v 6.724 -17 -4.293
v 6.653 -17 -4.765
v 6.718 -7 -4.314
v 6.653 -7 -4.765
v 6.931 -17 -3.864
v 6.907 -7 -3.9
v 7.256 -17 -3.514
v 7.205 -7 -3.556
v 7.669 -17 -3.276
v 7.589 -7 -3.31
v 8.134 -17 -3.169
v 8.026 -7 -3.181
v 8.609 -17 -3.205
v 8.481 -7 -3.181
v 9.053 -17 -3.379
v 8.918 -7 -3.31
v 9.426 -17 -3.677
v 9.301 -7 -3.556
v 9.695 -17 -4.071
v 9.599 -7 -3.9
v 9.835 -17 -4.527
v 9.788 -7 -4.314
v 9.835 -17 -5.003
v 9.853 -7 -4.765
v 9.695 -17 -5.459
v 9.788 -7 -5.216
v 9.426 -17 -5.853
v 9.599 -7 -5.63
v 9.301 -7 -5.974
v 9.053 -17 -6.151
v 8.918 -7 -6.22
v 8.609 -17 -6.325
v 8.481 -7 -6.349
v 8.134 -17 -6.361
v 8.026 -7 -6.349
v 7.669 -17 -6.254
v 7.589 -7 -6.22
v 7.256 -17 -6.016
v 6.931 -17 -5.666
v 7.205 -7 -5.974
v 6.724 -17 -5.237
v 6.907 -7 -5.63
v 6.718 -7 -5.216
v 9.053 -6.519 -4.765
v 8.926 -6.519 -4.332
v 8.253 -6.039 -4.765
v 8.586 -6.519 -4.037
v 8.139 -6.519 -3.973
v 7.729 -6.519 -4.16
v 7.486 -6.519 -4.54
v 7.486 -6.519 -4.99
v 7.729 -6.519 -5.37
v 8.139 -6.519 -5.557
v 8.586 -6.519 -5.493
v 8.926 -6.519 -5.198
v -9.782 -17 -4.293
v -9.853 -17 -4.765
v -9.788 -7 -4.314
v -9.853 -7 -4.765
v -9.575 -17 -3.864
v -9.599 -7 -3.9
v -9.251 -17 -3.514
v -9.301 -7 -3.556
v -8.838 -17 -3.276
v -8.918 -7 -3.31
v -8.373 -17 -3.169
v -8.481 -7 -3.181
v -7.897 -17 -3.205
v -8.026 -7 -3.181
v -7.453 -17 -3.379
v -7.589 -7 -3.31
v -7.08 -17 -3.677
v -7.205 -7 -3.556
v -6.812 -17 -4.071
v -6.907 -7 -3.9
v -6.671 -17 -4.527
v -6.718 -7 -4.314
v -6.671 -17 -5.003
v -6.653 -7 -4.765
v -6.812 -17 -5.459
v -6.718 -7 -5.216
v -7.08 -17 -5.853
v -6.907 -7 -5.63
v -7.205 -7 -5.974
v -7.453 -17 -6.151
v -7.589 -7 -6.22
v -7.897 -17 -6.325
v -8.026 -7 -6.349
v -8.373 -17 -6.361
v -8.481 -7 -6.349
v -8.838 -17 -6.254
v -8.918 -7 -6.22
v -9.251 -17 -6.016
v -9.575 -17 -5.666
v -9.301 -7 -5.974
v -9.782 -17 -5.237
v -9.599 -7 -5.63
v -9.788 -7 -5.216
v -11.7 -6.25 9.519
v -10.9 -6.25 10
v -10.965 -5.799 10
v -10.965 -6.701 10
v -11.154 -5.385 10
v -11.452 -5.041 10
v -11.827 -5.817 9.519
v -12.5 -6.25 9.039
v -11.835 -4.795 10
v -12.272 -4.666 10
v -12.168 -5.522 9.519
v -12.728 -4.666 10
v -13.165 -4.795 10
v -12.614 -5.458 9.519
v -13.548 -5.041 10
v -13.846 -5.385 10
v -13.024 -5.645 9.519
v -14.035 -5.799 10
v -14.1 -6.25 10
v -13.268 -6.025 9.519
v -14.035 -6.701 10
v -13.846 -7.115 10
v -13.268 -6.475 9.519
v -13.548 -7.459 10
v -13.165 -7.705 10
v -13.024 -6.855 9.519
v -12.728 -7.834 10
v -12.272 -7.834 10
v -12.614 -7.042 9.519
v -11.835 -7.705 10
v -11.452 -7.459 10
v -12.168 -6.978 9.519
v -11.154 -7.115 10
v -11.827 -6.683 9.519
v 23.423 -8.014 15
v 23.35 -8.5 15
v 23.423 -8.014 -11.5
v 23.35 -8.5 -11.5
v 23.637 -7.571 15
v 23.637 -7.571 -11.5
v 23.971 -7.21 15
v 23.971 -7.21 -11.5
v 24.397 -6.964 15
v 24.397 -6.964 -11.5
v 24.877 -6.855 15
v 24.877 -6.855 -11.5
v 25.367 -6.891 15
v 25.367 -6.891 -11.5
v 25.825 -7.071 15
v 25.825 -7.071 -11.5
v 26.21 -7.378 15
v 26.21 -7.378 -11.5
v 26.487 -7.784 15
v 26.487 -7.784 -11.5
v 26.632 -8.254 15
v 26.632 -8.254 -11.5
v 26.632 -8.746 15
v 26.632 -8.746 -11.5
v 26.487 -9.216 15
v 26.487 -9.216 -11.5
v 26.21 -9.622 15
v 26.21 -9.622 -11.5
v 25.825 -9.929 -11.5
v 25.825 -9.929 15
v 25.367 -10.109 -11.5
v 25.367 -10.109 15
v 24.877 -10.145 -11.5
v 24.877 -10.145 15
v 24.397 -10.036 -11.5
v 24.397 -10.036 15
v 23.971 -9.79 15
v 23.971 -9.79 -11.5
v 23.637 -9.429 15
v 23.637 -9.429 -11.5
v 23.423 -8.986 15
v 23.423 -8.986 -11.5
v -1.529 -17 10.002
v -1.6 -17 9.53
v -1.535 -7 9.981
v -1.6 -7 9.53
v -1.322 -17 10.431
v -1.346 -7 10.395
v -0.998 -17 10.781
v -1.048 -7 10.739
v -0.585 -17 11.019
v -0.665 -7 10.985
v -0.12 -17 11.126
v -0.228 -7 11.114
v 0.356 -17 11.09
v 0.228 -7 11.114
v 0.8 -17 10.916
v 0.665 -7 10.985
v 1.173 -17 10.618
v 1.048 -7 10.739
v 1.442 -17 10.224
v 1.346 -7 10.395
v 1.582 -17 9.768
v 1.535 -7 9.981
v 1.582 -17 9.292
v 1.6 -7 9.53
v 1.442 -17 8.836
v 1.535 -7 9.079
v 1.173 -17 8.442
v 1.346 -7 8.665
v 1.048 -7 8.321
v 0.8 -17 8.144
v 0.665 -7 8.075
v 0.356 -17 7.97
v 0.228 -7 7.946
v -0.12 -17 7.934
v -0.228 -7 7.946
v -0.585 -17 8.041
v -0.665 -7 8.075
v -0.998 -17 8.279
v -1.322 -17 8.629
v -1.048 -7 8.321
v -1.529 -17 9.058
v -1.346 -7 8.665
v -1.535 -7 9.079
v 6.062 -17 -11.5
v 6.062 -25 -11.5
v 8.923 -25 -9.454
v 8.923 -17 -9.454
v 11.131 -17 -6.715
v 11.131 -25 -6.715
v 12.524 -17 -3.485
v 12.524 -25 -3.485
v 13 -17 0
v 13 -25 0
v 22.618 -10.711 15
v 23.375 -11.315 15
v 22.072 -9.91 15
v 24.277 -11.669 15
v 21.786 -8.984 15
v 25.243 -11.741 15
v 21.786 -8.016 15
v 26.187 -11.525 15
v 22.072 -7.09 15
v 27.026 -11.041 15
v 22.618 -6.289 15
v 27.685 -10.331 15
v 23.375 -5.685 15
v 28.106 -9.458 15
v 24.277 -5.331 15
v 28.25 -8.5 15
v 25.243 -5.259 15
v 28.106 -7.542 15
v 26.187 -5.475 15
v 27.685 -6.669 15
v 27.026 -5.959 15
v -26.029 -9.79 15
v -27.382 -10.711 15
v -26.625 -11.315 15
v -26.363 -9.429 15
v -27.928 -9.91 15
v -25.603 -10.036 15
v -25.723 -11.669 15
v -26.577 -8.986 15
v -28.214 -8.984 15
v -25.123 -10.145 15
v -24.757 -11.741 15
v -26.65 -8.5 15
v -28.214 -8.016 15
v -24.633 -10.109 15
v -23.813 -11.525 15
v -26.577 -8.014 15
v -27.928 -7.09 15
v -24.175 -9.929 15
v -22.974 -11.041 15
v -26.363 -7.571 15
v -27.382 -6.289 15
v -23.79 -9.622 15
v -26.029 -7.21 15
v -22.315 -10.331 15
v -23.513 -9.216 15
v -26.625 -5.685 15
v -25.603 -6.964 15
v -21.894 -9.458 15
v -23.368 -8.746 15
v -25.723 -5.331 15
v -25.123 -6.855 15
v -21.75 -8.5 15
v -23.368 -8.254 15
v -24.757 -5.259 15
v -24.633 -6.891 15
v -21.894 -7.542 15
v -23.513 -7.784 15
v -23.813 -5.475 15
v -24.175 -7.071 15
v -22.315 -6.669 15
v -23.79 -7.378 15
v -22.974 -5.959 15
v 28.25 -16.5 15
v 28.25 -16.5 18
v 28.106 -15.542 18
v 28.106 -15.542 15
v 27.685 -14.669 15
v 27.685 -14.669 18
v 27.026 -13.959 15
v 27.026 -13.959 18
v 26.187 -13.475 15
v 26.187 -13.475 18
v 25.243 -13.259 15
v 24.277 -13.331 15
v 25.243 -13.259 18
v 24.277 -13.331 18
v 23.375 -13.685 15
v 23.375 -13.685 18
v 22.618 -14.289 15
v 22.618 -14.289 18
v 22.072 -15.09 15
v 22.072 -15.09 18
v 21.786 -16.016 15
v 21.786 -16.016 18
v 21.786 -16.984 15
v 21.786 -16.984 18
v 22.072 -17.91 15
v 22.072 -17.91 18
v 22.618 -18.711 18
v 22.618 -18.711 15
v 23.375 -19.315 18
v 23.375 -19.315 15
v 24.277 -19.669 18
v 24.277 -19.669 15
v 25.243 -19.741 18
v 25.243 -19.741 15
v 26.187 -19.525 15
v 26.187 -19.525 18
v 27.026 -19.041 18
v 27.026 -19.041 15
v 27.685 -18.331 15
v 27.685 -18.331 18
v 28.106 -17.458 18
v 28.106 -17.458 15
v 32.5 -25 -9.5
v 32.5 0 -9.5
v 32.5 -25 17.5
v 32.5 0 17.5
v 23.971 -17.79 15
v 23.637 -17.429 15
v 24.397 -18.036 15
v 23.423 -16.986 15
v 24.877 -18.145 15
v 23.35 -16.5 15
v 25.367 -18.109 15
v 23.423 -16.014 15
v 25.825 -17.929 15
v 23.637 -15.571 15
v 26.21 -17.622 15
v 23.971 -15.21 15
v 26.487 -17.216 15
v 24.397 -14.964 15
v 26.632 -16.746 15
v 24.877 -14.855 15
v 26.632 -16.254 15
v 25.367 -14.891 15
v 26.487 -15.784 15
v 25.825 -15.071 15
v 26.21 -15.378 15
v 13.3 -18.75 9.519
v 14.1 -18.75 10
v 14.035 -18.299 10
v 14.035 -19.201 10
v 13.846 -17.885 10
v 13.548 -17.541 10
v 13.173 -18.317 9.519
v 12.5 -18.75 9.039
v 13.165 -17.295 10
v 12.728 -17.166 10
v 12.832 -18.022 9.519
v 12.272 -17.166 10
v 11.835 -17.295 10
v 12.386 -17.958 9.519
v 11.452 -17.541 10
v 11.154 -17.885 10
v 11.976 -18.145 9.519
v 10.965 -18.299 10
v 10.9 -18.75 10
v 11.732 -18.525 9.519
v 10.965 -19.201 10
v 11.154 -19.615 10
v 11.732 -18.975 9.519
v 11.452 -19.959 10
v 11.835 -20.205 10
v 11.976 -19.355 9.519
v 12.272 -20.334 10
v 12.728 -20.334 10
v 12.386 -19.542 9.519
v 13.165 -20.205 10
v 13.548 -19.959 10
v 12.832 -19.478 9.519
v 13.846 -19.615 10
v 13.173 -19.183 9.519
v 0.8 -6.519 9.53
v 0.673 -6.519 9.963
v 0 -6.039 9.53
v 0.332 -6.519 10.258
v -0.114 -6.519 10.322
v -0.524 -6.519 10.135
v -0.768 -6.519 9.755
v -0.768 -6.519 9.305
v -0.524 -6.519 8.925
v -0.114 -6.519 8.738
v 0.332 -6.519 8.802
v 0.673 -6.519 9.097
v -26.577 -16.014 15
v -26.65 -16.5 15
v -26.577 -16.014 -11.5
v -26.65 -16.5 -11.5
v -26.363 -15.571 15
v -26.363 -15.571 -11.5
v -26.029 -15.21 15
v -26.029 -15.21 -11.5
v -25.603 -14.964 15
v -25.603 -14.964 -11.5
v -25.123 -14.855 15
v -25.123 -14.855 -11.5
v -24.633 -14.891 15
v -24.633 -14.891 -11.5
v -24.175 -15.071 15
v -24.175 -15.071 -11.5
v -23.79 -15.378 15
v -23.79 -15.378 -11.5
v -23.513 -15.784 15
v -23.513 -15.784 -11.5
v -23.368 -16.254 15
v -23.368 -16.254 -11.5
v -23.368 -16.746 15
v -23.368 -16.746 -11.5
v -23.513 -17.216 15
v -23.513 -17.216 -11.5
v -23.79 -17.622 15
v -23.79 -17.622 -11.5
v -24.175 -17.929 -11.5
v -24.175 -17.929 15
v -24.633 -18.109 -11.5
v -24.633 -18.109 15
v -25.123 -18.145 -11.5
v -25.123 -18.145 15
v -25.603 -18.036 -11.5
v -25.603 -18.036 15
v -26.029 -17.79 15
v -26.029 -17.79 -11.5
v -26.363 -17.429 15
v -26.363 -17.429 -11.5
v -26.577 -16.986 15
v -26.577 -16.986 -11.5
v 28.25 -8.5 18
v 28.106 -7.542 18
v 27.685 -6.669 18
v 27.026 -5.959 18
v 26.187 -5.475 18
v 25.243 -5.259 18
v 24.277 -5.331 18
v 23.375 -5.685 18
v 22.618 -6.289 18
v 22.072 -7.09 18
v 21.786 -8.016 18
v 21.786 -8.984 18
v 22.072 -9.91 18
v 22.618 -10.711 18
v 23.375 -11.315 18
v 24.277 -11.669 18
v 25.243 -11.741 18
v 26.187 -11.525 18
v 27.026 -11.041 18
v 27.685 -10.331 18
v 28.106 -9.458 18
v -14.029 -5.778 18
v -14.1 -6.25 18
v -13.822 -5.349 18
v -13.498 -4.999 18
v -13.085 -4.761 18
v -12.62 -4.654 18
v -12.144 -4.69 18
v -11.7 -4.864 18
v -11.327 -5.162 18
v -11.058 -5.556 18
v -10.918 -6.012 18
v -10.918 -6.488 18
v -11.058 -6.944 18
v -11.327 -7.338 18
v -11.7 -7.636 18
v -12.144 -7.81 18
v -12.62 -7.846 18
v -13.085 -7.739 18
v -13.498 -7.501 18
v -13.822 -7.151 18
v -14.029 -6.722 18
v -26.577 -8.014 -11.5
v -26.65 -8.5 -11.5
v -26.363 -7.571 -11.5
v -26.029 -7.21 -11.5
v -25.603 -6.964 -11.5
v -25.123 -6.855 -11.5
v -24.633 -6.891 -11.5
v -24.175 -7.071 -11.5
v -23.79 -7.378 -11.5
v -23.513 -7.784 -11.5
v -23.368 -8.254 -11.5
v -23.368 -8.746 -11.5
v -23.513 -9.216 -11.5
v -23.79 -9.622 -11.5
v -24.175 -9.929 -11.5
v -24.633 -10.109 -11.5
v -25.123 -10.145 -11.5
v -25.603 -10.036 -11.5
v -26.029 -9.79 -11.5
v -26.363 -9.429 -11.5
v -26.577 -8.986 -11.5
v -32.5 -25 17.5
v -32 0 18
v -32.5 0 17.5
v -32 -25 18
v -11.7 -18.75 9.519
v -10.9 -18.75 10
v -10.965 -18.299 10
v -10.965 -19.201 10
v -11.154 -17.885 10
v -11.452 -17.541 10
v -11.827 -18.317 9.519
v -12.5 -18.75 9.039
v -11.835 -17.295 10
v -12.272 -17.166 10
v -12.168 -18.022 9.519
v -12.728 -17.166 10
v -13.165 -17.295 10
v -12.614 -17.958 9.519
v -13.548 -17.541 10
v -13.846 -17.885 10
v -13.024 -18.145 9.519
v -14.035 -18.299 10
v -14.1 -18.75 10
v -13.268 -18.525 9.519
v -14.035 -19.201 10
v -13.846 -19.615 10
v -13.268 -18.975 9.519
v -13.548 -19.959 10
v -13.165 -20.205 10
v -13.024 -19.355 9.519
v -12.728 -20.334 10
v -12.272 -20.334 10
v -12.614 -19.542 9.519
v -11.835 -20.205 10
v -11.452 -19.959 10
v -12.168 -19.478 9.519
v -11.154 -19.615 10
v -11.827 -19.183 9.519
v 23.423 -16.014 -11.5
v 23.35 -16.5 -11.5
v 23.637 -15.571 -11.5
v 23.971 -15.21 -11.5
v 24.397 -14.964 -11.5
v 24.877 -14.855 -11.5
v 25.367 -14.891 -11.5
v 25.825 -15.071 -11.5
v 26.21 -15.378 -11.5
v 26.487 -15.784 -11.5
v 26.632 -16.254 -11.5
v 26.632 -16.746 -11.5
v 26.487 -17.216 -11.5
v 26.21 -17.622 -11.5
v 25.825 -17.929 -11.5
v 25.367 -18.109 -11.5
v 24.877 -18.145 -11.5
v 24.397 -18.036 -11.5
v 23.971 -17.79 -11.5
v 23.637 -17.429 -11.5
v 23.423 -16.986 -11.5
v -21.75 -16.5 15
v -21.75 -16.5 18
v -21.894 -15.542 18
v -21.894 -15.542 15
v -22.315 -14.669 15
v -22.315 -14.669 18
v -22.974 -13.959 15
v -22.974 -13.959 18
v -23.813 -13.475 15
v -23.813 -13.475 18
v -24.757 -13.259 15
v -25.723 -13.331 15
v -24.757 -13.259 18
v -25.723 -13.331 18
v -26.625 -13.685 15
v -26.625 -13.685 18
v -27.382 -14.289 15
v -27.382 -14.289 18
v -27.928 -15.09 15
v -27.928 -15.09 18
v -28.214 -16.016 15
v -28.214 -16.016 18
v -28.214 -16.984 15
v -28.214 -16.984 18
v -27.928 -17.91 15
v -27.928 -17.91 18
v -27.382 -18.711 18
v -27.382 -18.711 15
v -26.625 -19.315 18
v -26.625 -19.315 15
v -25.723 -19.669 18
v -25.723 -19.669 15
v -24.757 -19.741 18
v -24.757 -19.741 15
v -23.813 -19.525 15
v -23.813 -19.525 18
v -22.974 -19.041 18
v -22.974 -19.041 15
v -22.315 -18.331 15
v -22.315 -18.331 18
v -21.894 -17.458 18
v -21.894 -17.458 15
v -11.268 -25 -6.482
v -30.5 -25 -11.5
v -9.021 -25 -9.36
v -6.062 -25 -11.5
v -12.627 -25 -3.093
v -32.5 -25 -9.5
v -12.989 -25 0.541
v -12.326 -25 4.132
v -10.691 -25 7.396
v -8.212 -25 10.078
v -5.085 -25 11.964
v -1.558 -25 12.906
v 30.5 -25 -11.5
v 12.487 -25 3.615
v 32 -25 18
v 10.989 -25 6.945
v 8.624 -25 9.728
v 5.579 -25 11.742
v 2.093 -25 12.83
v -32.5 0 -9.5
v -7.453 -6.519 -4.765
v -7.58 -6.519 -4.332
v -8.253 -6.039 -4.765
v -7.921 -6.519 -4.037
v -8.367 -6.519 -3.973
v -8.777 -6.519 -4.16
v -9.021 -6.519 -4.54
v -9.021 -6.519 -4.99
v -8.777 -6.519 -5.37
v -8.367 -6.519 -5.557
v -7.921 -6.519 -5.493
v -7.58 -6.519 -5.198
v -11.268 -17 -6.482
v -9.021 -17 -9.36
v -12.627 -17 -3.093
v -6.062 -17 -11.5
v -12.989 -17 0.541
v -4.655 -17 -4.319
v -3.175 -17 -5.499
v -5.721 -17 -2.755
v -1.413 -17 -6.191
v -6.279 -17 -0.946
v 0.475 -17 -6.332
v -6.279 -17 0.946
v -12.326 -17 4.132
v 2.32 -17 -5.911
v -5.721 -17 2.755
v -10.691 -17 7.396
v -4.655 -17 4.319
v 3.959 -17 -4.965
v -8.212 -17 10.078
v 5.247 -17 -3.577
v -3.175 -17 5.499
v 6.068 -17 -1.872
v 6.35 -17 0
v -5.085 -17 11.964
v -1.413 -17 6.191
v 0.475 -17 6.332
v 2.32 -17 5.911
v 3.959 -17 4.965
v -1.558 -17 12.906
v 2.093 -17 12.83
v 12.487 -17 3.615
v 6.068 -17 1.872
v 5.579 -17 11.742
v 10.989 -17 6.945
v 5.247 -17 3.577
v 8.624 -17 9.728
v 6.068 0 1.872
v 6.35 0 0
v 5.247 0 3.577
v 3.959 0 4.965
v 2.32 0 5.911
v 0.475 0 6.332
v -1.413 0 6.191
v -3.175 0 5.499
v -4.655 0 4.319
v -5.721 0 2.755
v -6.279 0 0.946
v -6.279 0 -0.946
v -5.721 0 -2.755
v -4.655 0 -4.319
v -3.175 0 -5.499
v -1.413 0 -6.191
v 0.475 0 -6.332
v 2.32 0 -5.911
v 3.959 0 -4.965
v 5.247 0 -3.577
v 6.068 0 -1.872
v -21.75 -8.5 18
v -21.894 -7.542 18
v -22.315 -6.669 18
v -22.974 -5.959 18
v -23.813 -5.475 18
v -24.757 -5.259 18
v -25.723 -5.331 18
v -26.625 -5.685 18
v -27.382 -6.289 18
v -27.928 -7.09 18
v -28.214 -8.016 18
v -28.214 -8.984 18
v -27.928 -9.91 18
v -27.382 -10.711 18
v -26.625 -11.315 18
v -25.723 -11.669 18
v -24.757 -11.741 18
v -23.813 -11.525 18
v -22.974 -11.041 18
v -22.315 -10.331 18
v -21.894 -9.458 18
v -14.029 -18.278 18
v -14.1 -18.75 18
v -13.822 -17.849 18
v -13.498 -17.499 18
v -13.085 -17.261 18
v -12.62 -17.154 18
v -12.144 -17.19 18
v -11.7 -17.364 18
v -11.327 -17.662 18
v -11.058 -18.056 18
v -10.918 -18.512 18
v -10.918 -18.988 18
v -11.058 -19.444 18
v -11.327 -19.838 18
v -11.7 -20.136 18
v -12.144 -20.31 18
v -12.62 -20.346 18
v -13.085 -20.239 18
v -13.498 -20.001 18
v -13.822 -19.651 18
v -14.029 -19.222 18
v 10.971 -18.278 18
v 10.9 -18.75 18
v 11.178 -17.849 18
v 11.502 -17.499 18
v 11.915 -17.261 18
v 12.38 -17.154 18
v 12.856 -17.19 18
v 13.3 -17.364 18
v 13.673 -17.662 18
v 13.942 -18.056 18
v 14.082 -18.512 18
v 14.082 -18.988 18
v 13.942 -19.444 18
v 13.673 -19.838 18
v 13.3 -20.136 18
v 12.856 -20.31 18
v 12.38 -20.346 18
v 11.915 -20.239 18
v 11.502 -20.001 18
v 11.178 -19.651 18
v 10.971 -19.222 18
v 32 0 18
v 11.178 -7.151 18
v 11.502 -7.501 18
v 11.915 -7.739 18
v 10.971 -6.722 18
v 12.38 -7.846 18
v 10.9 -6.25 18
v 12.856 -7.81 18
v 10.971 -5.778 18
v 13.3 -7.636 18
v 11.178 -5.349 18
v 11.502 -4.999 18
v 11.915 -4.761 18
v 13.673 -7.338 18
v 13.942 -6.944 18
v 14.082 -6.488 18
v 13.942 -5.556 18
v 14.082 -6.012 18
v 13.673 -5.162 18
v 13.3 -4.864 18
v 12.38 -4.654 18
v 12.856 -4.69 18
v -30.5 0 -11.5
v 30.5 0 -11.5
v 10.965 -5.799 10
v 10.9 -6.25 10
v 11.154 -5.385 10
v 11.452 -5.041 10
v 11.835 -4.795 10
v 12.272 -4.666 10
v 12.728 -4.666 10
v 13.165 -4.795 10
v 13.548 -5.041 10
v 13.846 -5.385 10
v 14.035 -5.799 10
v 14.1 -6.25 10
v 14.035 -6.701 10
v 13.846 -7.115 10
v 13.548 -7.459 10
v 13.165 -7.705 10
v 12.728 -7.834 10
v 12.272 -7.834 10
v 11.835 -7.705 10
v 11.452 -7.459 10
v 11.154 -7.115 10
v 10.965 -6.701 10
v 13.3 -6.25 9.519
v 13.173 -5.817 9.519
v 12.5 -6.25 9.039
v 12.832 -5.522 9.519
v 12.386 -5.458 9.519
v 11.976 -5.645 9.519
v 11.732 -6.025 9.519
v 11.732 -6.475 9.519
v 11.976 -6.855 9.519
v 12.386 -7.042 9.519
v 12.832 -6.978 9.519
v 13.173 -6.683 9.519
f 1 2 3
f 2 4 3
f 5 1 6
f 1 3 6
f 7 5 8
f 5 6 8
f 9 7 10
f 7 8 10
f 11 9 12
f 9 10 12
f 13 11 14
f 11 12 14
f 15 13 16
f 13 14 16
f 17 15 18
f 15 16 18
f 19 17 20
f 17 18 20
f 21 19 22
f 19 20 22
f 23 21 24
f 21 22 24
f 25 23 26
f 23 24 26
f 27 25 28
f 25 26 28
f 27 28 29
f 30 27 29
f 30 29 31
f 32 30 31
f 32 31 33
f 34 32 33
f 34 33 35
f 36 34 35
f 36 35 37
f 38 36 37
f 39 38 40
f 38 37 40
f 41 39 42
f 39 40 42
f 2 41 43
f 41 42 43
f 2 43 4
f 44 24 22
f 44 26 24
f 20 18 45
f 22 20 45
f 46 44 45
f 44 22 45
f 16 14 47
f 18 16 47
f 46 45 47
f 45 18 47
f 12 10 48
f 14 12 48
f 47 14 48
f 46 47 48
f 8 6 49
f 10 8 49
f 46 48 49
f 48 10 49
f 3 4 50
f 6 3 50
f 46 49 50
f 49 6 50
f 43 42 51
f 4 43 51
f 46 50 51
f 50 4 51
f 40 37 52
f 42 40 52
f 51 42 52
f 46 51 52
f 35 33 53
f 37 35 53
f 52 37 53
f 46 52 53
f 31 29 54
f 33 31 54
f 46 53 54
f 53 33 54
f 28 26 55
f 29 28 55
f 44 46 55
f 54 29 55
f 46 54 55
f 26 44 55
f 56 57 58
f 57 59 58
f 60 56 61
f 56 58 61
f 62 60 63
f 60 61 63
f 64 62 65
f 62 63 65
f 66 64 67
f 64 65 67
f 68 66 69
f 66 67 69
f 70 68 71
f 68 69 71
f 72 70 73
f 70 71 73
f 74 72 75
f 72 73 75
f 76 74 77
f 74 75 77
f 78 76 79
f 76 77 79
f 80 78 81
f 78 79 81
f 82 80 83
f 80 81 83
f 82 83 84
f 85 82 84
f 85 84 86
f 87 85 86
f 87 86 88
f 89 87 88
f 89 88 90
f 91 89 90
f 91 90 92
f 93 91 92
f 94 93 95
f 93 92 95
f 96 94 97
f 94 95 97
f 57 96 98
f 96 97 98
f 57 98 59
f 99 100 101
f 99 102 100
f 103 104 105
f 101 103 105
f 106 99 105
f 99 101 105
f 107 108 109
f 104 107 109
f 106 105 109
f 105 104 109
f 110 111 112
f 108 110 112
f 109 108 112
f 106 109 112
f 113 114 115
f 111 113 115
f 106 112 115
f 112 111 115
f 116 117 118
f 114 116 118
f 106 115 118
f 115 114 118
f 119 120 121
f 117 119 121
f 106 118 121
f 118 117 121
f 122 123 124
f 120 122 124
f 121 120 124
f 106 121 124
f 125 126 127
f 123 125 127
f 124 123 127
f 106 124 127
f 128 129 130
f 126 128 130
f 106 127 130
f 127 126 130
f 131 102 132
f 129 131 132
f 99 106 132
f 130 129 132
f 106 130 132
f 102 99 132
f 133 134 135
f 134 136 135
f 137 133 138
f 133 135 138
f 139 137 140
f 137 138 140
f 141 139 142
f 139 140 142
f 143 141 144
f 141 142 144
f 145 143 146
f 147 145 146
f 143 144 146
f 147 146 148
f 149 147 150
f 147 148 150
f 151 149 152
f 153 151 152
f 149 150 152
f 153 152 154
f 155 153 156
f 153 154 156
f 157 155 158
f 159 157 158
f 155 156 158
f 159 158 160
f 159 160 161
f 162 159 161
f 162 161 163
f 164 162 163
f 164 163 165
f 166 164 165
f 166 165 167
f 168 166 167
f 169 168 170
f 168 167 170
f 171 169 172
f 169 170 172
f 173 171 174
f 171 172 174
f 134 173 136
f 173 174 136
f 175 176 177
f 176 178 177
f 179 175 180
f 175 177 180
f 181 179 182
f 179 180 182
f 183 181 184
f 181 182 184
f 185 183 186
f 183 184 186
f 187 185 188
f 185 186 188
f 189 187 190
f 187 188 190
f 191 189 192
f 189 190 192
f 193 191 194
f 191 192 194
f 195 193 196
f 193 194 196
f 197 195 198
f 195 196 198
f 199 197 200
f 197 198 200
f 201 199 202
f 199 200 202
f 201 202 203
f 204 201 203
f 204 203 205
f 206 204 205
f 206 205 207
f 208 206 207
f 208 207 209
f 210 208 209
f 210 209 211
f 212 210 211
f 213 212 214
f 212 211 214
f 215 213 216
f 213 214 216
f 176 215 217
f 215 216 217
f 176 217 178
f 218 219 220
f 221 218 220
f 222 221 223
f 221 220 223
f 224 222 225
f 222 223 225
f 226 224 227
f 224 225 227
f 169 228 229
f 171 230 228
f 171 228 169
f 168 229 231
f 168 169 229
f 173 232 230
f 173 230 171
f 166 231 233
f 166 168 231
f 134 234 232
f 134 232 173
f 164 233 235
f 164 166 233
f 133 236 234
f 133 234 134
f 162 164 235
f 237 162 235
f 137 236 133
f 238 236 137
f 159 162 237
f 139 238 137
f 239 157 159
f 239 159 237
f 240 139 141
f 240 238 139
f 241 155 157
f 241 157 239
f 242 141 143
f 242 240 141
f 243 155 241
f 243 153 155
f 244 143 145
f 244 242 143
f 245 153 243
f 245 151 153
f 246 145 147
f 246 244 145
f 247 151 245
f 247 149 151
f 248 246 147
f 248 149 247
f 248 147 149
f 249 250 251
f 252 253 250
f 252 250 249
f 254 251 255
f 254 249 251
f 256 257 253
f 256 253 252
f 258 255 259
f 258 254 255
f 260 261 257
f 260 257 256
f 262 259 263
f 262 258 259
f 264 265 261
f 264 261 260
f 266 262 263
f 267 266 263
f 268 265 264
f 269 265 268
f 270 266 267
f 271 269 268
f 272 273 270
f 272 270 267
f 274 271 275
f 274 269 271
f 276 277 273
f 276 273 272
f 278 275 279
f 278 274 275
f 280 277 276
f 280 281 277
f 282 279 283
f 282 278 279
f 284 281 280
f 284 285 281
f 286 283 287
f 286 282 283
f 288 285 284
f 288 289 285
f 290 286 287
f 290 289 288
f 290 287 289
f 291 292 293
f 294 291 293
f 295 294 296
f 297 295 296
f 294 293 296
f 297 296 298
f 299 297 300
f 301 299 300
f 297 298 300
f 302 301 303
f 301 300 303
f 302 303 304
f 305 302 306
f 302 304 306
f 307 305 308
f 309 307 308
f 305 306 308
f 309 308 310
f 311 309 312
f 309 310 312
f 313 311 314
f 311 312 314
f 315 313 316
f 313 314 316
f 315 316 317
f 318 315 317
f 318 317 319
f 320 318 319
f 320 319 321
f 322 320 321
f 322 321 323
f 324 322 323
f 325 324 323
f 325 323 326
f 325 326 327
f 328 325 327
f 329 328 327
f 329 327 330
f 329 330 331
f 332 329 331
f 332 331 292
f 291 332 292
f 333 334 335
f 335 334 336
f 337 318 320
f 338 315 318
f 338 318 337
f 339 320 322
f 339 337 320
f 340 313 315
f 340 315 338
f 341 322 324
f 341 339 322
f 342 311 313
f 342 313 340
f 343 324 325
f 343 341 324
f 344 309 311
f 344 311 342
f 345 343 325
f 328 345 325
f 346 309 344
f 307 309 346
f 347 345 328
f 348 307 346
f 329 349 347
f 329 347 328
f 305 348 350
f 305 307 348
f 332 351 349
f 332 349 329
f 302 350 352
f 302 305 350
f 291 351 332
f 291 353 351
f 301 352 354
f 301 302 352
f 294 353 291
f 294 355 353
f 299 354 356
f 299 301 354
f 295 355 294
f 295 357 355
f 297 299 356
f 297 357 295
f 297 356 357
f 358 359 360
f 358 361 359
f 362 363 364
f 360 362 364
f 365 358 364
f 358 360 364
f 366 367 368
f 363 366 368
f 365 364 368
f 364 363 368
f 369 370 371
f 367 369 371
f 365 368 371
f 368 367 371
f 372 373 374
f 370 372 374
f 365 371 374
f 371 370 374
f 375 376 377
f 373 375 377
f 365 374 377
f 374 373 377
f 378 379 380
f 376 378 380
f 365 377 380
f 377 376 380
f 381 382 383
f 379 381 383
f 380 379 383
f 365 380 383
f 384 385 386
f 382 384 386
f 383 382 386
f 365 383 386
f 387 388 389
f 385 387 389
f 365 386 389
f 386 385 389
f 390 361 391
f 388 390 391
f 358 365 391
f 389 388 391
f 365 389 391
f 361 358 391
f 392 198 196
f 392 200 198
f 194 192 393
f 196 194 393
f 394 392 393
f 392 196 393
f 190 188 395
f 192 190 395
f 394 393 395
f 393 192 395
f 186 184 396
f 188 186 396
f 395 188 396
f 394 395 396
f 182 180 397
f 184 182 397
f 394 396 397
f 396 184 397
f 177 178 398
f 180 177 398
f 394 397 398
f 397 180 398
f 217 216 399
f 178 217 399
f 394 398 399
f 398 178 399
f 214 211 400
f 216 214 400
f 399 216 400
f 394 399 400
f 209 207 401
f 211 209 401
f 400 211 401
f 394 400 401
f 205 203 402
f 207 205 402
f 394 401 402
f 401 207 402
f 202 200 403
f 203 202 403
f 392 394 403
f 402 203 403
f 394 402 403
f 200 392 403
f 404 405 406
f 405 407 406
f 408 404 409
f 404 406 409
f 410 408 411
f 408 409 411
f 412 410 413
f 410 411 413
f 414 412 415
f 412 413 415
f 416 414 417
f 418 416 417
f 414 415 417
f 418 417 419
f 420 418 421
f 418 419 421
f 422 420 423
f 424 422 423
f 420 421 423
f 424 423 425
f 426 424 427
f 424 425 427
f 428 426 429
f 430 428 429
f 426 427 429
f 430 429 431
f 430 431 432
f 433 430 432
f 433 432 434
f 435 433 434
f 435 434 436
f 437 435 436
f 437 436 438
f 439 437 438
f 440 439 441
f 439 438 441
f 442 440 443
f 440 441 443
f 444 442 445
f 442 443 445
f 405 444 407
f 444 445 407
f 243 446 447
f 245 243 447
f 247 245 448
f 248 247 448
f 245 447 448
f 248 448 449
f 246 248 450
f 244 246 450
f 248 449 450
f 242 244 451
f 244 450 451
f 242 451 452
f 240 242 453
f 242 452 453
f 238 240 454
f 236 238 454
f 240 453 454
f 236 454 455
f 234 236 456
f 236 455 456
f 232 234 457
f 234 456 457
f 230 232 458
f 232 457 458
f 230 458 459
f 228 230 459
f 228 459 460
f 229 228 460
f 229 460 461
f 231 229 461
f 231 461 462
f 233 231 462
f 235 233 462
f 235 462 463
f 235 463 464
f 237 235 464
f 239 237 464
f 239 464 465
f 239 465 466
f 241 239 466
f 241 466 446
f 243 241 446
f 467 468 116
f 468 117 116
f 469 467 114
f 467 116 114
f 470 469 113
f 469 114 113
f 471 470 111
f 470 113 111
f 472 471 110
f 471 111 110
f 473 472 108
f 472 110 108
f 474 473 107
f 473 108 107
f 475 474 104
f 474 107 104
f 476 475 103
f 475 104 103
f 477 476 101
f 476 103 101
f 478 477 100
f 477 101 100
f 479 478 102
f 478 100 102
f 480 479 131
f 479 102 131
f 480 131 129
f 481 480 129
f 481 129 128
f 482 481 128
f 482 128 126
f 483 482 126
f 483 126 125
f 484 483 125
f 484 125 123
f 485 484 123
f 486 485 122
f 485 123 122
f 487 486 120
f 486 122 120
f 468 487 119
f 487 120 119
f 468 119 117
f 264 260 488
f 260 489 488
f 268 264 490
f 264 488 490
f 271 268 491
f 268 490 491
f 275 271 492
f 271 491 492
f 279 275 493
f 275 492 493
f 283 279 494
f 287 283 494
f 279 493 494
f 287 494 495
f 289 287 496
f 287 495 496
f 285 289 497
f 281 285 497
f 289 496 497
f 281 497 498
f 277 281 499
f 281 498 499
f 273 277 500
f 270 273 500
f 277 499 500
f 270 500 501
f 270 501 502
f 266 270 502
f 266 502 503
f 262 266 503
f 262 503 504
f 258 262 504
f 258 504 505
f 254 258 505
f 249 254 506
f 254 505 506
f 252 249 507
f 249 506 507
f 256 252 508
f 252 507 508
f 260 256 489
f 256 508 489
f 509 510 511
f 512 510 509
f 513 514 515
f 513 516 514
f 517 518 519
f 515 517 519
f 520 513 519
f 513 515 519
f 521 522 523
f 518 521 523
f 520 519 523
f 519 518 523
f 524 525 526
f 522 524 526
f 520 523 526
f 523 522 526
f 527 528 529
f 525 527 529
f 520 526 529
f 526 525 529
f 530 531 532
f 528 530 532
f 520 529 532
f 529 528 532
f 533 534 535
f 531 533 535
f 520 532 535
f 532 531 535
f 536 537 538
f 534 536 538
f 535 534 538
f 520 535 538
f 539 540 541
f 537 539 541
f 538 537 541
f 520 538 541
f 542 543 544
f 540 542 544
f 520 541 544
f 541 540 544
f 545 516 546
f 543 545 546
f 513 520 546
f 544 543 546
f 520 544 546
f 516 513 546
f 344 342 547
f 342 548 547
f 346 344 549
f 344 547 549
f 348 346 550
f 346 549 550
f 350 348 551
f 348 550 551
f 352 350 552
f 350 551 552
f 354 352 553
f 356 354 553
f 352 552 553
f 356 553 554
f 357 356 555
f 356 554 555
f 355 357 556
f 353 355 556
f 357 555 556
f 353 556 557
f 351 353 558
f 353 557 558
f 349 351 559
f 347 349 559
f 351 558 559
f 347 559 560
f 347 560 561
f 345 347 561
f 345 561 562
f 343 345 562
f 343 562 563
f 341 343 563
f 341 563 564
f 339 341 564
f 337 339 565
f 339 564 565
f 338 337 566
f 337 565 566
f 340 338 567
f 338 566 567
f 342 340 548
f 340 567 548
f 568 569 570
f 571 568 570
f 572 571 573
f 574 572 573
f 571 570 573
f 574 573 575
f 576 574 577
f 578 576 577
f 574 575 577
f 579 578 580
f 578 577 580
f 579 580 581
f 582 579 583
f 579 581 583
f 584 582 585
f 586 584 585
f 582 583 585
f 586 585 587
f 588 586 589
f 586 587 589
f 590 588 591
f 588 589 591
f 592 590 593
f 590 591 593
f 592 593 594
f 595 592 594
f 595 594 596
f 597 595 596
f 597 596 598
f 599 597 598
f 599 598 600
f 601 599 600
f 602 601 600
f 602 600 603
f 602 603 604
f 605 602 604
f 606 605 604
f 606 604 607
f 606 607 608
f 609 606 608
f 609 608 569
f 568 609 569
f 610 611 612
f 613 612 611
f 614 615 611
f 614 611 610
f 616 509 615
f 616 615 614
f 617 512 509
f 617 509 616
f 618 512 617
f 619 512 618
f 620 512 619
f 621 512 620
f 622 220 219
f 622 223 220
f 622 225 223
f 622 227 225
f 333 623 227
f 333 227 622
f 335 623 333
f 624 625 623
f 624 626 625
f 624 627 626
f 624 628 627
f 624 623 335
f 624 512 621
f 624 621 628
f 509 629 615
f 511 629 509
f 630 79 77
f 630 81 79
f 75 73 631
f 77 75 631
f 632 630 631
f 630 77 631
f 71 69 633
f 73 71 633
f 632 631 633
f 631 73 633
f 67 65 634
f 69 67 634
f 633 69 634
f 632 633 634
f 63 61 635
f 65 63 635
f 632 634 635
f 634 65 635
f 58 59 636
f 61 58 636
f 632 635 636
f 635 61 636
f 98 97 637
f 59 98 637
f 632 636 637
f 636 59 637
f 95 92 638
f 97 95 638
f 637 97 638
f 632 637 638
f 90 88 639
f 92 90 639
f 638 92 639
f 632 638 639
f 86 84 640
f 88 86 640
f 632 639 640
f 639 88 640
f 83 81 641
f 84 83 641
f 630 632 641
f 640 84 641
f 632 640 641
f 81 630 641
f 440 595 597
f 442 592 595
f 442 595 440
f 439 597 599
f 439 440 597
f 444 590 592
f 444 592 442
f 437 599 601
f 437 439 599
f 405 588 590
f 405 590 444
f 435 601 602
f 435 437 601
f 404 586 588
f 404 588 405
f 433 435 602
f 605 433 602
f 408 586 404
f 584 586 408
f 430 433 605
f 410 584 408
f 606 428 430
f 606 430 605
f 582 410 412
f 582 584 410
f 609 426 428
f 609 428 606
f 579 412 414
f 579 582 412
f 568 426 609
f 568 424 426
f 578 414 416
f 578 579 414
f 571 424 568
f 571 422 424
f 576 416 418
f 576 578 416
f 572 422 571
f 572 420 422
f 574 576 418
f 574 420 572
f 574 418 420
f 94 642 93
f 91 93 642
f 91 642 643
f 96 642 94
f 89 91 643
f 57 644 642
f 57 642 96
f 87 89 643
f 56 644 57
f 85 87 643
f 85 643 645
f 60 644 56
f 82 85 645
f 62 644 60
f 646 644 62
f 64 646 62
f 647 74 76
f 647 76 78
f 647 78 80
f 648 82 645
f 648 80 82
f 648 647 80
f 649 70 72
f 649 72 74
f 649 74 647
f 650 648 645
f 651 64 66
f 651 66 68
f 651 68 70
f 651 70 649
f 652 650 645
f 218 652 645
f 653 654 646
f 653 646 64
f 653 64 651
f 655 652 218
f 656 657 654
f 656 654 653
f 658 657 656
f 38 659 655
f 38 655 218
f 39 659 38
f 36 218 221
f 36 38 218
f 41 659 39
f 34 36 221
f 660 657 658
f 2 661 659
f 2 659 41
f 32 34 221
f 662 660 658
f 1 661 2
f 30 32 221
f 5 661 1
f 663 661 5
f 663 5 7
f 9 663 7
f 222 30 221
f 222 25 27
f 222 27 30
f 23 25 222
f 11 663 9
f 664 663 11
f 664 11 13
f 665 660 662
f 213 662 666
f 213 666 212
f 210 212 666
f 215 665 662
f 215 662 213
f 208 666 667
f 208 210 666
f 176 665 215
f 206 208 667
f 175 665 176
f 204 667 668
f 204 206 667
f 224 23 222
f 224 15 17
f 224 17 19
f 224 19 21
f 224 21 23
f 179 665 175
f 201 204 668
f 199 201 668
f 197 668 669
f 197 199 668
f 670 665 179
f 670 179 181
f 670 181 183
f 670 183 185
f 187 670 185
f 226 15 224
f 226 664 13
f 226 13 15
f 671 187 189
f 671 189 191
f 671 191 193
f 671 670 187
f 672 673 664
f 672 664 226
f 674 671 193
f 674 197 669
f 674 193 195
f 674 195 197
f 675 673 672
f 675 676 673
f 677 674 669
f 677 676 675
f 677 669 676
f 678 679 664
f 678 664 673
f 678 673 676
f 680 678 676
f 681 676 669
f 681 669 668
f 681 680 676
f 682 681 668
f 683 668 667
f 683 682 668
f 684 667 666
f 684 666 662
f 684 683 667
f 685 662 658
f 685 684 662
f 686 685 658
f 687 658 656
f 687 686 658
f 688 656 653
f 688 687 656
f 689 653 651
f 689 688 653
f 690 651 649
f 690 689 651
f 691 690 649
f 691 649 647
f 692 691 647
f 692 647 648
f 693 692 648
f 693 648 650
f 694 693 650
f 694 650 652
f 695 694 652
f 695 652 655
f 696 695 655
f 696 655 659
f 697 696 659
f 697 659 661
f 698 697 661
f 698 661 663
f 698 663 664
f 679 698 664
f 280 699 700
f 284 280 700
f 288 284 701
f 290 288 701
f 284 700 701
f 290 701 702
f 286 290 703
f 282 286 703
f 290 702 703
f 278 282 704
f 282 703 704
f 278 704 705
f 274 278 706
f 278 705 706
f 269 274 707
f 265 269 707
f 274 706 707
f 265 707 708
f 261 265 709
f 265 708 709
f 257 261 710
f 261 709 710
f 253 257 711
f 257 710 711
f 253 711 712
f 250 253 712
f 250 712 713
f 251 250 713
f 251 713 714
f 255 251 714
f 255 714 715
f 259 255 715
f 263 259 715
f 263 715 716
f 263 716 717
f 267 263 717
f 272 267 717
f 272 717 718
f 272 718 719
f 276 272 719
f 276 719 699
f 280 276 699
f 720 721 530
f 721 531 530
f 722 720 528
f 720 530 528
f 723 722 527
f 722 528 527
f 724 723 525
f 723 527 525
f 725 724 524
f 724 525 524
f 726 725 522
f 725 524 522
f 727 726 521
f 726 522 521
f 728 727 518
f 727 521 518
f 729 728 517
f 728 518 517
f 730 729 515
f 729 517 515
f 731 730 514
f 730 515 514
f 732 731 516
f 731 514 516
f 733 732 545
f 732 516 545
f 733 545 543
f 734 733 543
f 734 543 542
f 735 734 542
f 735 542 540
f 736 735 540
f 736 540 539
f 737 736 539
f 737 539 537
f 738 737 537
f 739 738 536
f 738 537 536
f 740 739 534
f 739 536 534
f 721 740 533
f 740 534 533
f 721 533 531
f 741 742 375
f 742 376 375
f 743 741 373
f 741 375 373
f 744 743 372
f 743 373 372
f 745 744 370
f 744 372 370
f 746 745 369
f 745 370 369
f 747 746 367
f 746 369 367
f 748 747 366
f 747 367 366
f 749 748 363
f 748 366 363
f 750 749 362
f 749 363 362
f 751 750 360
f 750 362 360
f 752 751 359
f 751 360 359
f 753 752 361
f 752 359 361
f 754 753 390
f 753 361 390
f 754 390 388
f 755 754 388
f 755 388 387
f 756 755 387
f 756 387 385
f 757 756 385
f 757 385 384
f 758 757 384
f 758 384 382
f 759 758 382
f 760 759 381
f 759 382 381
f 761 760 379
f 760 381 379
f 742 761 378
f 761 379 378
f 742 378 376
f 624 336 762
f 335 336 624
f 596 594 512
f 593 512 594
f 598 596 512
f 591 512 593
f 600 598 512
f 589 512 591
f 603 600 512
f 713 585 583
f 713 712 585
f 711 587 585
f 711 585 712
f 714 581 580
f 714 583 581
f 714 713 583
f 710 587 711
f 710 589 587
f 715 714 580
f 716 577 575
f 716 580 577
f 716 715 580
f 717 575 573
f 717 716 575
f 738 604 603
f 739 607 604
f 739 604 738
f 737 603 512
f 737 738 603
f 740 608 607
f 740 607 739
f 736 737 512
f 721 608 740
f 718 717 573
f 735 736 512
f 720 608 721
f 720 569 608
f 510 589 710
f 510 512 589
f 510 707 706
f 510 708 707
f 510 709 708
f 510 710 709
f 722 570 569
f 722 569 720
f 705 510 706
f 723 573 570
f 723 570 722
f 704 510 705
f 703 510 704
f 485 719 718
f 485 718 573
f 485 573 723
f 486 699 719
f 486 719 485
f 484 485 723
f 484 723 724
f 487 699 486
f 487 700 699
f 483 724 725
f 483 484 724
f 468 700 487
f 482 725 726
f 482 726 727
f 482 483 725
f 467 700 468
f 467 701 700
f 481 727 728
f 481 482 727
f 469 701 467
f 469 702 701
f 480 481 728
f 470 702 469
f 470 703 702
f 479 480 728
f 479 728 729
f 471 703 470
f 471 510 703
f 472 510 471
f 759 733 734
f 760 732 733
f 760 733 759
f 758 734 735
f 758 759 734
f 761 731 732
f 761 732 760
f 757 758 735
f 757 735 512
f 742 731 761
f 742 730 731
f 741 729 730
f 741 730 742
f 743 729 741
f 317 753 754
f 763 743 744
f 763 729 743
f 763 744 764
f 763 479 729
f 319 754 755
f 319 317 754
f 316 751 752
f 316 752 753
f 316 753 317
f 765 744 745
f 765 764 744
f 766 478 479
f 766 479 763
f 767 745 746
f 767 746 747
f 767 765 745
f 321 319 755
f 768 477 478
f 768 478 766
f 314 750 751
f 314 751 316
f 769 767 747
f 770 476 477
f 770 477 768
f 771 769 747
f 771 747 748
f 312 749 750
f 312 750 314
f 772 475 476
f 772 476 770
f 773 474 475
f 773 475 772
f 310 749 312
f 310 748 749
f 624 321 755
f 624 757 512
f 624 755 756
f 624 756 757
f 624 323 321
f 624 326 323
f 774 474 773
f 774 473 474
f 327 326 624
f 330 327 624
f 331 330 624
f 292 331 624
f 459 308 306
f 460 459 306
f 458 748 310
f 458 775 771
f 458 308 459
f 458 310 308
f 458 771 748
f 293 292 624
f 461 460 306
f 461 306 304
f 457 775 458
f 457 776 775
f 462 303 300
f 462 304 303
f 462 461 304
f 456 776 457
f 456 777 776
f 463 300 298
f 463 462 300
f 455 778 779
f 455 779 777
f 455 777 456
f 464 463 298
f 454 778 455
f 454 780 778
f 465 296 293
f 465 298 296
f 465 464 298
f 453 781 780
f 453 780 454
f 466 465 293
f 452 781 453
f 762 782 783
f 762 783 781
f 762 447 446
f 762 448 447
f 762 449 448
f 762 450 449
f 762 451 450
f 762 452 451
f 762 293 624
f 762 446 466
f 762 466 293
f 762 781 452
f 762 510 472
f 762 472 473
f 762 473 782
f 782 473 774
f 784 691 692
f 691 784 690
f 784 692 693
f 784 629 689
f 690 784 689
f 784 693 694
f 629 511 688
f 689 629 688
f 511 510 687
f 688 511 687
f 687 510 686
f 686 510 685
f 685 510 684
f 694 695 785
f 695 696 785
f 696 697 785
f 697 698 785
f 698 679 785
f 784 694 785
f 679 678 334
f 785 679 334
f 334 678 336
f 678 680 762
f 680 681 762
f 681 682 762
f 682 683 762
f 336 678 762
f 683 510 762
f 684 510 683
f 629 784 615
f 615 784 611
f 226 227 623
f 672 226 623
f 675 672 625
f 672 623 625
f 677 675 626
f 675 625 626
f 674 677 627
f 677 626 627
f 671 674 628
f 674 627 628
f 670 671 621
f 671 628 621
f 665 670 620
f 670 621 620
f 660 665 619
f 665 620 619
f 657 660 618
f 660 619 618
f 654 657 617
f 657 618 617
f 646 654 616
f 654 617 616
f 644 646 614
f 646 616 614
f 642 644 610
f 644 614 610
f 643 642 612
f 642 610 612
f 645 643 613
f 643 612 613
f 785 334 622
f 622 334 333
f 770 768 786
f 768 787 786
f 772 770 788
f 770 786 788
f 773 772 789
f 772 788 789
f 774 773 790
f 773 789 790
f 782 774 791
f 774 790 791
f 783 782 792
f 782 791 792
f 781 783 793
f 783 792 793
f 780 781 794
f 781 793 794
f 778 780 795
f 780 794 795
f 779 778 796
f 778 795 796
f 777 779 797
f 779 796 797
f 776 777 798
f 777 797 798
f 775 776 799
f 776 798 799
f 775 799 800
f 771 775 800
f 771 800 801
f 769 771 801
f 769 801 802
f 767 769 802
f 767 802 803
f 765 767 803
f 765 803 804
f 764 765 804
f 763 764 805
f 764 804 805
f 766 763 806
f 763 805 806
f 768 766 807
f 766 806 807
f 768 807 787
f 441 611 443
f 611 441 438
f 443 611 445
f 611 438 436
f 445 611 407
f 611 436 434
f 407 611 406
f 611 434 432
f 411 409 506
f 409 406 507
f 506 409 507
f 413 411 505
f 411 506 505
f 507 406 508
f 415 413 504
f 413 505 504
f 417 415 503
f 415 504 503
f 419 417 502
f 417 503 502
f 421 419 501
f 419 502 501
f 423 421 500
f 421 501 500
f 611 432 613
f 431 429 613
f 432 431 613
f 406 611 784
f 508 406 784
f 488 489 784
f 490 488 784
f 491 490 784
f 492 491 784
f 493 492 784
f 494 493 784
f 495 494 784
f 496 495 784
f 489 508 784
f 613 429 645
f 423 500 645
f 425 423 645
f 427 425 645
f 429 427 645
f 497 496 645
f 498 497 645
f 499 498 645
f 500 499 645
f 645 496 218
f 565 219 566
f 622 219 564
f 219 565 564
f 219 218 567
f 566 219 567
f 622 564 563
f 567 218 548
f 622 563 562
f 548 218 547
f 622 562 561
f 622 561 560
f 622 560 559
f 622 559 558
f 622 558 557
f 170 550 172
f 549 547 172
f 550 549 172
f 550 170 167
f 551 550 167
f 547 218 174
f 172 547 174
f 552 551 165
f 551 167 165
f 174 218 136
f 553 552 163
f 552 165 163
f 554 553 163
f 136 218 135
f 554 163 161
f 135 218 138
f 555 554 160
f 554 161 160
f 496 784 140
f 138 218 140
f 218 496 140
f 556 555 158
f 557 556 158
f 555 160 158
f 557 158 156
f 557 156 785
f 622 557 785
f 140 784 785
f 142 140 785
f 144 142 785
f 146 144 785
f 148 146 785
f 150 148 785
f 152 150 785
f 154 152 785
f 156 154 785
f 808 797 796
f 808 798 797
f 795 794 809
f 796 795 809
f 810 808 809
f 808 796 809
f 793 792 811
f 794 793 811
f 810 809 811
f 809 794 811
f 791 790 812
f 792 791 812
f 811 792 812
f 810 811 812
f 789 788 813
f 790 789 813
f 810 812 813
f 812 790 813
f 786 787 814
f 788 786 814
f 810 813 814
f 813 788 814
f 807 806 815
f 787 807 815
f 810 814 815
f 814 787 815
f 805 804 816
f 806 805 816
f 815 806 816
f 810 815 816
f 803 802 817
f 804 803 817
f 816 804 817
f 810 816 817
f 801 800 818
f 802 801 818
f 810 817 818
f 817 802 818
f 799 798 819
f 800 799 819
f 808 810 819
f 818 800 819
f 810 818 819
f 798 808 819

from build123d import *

# Parameters (mm, degrees)
F0_W           = 65
F0_H           = 29.5
F0_R           = 6.35
F1_DEPTH       = 25
F2_SIZE        = 0.5
F3_R           = 6.35
F4_DEPTH       = 8
F5_SIZE        = 2
F7_D           = 3.2
F7_DEPTH       = 8
F7_TIP         = 0.9613769904
F9_D           = 3.3
F9_CBORE_D     = 6.5
F9_CBORE_DEPTH = 3
F11_D          = 3.2
F11_DEPTH      = 10
F11_TIP        = 0.9613769904


with BuildPart() as f1:
    # F0 (on Front) → F1 (new body)
    with BuildSketch(Plane.XZ):
        with Locations((0, 3.25)):
            Rectangle(F0_W, F0_H)
        Circle(F0_R, mode=Mode.SUBTRACT)
    extrude(amount=F1_DEPTH)

    # F2
    f2_edges = [f1.edges().sort_by_distance(p)[0] for p in [
        (-32.5, -12.5, 18),
        (32.5, -12.5, 18),
    ]]
    chamfer(f2_edges, length=F2_SIZE)

    # F3 (on face) → F4 (cut)
    with BuildSketch(Plane.XZ.offset(25)):
        with BuildLine():
            ThreePointArc((6.0621778265, -11.5), (11.1312243654, -6.7153439322), (13, 0))
            ThreePointArc((13, 0), (-6.7153439322, 11.1312243654), (-6.0621778265, -11.5))
            Line((-6.0621778265, -11.5), (6.0621778265, -11.5))
        make_face()
        Circle(F3_R, mode=Mode.SUBTRACT)
    extrude(amount=-F4_DEPTH, mode=Mode.SUBTRACT)

    # F5
    f5_edges = [f1.edges().sort_by_distance(p)[0] for p in [
        (32.5, -12.5, -11.5),
        (-32.5, -12.5, -11.5),
    ]]
    chamfer(f5_edges, length=F5_SIZE)

    # F7
    with Locations(Plane.XY.offset(18)):
        with Locations((12.5, -6.25), (12.5, -18.75), (-12.5, -6.25), (-12.5, -18.75)):
            Hole(F7_D / 2, depth=F7_DEPTH)
            with Locations((0, 0, -(F7_DEPTH + F7_TIP / 2))):  # 118° drill point
                Cone(0, F7_D / 2, F7_TIP, mode=Mode.SUBTRACT)

    # F9 (through all)
    with Locations(Plane.XY.offset(18)):
        with Locations((-25, -8.5), (-25, -16.5), (25, -8.5), (25, -16.5)):
            CounterBoreHole(F9_D / 2, F9_CBORE_D / 2, F9_CBORE_DEPTH)

    # F11
    with Locations(Plane.XZ.offset(17)):
        with Locations((0, 9.53), (8.2532220981, -4.765), (-8.2532220981, -4.765)):
            Hole(F11_D / 2, depth=F11_DEPTH)
            with Locations((0, 0, -(F11_DEPTH + F11_TIP / 2))):  # 118° drill point
                Cone(0, F11_D / 2, F11_TIP, mode=Mode.SUBTRACT)


solid = f1.part
